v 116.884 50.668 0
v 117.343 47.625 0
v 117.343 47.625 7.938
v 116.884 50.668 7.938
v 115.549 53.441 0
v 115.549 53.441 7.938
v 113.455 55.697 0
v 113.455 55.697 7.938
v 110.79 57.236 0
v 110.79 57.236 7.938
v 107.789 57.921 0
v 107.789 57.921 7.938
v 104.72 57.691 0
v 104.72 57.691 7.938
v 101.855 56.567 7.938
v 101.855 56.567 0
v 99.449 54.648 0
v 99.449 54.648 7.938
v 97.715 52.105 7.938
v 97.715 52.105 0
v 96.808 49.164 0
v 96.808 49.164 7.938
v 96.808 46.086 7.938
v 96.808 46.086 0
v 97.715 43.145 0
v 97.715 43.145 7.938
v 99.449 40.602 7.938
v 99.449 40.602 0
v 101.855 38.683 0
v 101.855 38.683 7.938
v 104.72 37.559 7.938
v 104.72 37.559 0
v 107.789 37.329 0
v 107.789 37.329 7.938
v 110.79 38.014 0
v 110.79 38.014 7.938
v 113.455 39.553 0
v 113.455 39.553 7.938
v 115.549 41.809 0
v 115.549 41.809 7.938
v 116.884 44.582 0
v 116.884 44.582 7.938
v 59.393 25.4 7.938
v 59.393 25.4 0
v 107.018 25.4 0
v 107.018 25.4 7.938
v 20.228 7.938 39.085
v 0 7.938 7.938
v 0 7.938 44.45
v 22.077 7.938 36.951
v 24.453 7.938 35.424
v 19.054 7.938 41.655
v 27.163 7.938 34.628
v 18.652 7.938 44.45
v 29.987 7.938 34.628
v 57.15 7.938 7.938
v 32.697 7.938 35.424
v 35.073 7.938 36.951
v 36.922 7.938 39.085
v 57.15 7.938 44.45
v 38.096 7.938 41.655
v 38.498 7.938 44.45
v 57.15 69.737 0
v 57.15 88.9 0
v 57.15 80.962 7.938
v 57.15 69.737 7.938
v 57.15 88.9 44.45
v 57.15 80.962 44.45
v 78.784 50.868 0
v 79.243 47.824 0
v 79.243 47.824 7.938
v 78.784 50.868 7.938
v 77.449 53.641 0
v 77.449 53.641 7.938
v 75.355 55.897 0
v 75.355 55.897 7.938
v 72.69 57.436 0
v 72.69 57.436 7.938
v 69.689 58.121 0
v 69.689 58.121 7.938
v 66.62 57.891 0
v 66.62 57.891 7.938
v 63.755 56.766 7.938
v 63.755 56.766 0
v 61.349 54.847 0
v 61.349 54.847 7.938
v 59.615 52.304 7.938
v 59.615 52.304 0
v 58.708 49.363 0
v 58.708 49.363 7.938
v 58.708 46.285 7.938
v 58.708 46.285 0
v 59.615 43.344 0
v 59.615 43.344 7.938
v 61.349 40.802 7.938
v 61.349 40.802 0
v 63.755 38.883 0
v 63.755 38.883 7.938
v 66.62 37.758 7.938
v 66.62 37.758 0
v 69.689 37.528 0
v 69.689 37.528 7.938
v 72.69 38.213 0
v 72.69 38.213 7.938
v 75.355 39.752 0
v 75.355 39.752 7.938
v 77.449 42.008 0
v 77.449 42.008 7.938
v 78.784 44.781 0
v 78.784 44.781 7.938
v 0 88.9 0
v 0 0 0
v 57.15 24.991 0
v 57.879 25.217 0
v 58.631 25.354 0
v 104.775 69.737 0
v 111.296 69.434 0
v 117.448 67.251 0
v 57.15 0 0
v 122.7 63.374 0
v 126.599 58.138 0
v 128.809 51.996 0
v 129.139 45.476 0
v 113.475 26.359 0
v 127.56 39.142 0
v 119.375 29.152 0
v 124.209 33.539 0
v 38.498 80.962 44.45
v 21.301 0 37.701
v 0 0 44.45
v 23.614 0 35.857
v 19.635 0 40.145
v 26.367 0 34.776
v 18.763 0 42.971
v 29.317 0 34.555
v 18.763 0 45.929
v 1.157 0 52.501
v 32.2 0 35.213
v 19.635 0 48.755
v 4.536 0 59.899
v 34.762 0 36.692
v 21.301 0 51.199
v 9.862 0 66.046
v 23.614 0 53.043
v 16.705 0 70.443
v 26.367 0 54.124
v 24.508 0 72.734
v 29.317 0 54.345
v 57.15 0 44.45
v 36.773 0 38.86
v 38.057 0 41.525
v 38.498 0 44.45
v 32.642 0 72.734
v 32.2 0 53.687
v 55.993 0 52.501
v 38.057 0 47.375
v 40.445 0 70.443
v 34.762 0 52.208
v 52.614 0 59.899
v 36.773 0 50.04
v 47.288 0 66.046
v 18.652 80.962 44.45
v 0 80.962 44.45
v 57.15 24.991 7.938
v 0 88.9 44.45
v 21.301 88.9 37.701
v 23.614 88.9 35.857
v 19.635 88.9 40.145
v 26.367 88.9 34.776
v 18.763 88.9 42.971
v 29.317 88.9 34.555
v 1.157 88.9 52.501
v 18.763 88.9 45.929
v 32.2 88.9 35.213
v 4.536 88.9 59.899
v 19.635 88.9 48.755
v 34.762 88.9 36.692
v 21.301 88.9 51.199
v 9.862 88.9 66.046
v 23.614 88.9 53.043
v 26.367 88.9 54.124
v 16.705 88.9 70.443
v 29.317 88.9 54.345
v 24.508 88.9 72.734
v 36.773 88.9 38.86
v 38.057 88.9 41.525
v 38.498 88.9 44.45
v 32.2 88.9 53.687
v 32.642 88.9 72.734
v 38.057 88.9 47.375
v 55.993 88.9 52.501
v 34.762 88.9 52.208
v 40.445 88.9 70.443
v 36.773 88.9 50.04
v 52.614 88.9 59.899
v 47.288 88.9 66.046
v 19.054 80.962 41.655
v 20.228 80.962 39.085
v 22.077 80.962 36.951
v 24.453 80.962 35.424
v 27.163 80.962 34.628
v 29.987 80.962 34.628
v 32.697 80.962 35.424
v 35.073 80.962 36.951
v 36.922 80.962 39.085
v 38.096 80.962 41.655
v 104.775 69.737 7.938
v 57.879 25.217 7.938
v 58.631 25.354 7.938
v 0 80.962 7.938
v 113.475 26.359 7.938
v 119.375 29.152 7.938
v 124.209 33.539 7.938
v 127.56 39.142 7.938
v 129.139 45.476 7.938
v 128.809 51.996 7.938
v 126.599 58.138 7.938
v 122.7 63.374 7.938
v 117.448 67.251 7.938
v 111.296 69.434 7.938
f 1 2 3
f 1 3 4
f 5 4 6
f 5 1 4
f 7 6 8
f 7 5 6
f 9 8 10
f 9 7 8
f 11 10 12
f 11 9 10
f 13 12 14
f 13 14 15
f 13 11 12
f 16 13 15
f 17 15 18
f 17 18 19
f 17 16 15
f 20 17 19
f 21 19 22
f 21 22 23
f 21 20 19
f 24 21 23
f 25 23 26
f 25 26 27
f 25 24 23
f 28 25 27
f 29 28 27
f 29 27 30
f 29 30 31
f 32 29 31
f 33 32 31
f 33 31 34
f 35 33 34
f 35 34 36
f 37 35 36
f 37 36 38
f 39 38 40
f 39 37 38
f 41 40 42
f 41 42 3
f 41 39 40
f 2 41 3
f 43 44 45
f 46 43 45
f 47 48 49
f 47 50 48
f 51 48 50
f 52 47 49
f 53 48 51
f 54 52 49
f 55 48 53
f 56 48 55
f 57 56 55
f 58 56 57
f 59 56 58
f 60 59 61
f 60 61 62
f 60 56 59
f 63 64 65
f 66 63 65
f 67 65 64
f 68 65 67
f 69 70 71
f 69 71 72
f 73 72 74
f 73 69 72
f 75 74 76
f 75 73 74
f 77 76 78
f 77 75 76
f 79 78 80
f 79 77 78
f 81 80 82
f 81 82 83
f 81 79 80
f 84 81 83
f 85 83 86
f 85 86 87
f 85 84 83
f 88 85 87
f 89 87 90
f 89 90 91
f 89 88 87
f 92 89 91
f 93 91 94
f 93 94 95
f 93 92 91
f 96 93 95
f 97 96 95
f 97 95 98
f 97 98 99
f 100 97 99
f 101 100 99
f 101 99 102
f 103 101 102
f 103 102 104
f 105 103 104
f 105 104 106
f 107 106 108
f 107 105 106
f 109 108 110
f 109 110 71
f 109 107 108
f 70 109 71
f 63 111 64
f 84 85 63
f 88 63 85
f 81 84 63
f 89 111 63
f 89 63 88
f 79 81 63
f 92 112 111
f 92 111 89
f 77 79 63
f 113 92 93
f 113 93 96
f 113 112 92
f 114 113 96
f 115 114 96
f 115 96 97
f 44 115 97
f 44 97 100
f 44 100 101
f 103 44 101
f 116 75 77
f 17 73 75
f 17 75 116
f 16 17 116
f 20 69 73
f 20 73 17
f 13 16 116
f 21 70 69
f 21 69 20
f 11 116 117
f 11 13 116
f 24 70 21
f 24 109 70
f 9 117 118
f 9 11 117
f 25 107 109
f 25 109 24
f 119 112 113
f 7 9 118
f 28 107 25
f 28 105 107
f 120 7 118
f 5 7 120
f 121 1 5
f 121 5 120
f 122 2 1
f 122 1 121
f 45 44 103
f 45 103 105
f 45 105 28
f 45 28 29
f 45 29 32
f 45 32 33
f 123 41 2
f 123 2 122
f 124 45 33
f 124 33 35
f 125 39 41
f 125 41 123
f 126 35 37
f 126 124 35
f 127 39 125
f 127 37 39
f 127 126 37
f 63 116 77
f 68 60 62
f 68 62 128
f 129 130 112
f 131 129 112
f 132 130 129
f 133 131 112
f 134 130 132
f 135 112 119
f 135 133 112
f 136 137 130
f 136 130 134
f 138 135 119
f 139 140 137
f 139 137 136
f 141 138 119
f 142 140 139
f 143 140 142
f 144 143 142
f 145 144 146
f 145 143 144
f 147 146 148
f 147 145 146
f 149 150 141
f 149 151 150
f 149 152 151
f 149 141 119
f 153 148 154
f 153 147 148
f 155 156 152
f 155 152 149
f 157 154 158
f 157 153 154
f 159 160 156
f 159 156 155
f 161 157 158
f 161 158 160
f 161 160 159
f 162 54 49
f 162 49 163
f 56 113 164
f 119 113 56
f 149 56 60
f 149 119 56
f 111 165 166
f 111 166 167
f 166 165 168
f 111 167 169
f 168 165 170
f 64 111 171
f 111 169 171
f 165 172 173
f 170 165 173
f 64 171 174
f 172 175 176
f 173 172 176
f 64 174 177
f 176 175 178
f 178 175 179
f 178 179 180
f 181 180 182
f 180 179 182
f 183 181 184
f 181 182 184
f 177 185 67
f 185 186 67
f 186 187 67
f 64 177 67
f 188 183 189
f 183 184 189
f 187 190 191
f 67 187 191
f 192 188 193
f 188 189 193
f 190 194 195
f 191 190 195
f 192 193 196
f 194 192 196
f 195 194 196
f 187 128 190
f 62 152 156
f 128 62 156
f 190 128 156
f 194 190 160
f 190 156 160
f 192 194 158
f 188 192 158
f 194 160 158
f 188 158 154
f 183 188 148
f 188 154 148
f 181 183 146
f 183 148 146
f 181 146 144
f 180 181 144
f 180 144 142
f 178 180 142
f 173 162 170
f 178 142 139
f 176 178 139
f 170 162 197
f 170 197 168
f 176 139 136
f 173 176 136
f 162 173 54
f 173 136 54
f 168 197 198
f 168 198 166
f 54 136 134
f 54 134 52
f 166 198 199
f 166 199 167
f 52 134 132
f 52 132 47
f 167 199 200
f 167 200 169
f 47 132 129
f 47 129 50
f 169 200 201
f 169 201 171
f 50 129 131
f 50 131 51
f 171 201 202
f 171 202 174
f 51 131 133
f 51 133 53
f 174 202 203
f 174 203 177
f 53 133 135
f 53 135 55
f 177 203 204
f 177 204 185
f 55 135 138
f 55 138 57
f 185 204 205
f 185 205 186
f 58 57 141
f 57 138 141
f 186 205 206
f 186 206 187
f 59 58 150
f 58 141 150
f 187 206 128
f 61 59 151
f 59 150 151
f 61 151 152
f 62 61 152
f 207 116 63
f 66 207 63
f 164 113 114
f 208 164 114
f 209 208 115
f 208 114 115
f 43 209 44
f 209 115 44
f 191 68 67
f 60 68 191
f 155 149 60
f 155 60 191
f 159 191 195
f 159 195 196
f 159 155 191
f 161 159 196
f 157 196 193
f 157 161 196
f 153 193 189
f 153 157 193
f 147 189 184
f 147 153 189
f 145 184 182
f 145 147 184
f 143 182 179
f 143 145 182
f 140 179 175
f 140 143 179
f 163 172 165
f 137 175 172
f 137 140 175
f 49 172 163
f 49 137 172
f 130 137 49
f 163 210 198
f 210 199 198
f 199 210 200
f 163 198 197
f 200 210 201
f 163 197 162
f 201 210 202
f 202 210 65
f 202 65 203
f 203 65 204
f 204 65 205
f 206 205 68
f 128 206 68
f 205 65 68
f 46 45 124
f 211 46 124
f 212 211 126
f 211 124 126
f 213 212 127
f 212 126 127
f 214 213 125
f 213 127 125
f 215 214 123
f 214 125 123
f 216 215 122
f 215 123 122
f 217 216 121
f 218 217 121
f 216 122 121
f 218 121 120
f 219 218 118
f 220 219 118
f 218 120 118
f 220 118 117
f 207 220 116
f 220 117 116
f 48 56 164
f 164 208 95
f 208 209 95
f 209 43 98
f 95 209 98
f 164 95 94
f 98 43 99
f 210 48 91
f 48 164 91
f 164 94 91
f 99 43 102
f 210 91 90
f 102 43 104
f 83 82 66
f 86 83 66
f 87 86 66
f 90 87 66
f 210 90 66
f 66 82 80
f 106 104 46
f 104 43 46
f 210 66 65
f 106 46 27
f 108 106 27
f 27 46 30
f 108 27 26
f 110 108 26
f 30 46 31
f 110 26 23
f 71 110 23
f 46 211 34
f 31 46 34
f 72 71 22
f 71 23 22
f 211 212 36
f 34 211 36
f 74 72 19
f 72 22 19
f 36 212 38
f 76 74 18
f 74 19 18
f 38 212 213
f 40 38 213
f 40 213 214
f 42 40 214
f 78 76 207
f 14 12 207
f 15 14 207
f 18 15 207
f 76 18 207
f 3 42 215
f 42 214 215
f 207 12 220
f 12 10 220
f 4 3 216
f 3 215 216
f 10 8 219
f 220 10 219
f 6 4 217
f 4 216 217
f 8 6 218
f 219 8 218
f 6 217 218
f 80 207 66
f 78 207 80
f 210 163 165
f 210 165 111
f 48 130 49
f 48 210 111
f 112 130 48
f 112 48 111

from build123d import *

# Parameters (mm, degrees)
F1_W     = 53.042872
F1_H     = 10.270788
F1_R     = 10.3251
F1_W_2   = 50.8
F1_H_2   = 6.999225
F2_DEPTH = 7.9375
F0_R     = 9.92251
F3_DEPTH = 88.9
F4_W     = 73.025
F4_H     = 36.5125
F5_DEPTH = 57.15


with BuildPart() as f2:
    # F1 (on Top) → F2 (new body)
    with BuildSketch(Plane.XY):
        with Locations((26.521436, 5.135394)):
            Rectangle(F1_W, F1_H)
        with BuildLine():
            Line((0, 10.270788), (53.042872, 10.270788))
            Line((53.042872, 10.270788), (53.042872, 19.05))
            ThreePointArc((53.042872, 19.05), (54.902744, 23.540128), (59.392872, 25.4))
            Line((59.392872, 25.4), (107.017872, 25.4))
            ThreePointArc((107.017872, 25.4), (129.214489, 48.74787), (104.775, 69.736539))
            Line((104.775, 69.736539), (57.15, 69.736539))
            ThreePointArc((57.15, 69.736539), (52.659872, 71.596411), (50.8, 76.086539))
            Line((50.8, 76.086539), (50.8, 81.900775))
            Line((50.8, 81.900775), (0, 81.900775))
            Line((0, 81.900775), (0, 10.270788))
        make_face()
        with Locations((68.917872, 47.824372)):
            Circle(F1_R, mode=Mode.SUBTRACT)
        with Locations((107.017872, 47.625)):
            Circle(F1_R, mode=Mode.SUBTRACT)
        with Locations((25.4, 85.400387)):
            Rectangle(F1_W_2, F1_H_2)
    extrude(amount=F2_DEPTH)

    # F0 (on Front) → F3 (join)
    with BuildSketch(Plane.XZ):
        with BuildLine():
            Line((0, 44.45), (0, 0))
            Line((0, 0), (57.15, 0))
            Line((57.15, 0), (57.15, 44.45))
            ThreePointArc((57.15, 44.45), (28.575, 73.025), (0, 44.45))
        make_face()
        with Locations((28.575, 44.45)):
            Circle(F0_R, mode=Mode.SUBTRACT)
    extrude(amount=-F3_DEPTH)

    # F4 (on face) → F5 (cut, through all)
    with BuildSketch(Plane.YZ.offset(57.15)):
        with Locations((44.45, 26.19375)):
            Rectangle(F4_W, F4_H)
    extrude(amount=-F5_DEPTH, mode=Mode.SUBTRACT)


solid = f2.part
